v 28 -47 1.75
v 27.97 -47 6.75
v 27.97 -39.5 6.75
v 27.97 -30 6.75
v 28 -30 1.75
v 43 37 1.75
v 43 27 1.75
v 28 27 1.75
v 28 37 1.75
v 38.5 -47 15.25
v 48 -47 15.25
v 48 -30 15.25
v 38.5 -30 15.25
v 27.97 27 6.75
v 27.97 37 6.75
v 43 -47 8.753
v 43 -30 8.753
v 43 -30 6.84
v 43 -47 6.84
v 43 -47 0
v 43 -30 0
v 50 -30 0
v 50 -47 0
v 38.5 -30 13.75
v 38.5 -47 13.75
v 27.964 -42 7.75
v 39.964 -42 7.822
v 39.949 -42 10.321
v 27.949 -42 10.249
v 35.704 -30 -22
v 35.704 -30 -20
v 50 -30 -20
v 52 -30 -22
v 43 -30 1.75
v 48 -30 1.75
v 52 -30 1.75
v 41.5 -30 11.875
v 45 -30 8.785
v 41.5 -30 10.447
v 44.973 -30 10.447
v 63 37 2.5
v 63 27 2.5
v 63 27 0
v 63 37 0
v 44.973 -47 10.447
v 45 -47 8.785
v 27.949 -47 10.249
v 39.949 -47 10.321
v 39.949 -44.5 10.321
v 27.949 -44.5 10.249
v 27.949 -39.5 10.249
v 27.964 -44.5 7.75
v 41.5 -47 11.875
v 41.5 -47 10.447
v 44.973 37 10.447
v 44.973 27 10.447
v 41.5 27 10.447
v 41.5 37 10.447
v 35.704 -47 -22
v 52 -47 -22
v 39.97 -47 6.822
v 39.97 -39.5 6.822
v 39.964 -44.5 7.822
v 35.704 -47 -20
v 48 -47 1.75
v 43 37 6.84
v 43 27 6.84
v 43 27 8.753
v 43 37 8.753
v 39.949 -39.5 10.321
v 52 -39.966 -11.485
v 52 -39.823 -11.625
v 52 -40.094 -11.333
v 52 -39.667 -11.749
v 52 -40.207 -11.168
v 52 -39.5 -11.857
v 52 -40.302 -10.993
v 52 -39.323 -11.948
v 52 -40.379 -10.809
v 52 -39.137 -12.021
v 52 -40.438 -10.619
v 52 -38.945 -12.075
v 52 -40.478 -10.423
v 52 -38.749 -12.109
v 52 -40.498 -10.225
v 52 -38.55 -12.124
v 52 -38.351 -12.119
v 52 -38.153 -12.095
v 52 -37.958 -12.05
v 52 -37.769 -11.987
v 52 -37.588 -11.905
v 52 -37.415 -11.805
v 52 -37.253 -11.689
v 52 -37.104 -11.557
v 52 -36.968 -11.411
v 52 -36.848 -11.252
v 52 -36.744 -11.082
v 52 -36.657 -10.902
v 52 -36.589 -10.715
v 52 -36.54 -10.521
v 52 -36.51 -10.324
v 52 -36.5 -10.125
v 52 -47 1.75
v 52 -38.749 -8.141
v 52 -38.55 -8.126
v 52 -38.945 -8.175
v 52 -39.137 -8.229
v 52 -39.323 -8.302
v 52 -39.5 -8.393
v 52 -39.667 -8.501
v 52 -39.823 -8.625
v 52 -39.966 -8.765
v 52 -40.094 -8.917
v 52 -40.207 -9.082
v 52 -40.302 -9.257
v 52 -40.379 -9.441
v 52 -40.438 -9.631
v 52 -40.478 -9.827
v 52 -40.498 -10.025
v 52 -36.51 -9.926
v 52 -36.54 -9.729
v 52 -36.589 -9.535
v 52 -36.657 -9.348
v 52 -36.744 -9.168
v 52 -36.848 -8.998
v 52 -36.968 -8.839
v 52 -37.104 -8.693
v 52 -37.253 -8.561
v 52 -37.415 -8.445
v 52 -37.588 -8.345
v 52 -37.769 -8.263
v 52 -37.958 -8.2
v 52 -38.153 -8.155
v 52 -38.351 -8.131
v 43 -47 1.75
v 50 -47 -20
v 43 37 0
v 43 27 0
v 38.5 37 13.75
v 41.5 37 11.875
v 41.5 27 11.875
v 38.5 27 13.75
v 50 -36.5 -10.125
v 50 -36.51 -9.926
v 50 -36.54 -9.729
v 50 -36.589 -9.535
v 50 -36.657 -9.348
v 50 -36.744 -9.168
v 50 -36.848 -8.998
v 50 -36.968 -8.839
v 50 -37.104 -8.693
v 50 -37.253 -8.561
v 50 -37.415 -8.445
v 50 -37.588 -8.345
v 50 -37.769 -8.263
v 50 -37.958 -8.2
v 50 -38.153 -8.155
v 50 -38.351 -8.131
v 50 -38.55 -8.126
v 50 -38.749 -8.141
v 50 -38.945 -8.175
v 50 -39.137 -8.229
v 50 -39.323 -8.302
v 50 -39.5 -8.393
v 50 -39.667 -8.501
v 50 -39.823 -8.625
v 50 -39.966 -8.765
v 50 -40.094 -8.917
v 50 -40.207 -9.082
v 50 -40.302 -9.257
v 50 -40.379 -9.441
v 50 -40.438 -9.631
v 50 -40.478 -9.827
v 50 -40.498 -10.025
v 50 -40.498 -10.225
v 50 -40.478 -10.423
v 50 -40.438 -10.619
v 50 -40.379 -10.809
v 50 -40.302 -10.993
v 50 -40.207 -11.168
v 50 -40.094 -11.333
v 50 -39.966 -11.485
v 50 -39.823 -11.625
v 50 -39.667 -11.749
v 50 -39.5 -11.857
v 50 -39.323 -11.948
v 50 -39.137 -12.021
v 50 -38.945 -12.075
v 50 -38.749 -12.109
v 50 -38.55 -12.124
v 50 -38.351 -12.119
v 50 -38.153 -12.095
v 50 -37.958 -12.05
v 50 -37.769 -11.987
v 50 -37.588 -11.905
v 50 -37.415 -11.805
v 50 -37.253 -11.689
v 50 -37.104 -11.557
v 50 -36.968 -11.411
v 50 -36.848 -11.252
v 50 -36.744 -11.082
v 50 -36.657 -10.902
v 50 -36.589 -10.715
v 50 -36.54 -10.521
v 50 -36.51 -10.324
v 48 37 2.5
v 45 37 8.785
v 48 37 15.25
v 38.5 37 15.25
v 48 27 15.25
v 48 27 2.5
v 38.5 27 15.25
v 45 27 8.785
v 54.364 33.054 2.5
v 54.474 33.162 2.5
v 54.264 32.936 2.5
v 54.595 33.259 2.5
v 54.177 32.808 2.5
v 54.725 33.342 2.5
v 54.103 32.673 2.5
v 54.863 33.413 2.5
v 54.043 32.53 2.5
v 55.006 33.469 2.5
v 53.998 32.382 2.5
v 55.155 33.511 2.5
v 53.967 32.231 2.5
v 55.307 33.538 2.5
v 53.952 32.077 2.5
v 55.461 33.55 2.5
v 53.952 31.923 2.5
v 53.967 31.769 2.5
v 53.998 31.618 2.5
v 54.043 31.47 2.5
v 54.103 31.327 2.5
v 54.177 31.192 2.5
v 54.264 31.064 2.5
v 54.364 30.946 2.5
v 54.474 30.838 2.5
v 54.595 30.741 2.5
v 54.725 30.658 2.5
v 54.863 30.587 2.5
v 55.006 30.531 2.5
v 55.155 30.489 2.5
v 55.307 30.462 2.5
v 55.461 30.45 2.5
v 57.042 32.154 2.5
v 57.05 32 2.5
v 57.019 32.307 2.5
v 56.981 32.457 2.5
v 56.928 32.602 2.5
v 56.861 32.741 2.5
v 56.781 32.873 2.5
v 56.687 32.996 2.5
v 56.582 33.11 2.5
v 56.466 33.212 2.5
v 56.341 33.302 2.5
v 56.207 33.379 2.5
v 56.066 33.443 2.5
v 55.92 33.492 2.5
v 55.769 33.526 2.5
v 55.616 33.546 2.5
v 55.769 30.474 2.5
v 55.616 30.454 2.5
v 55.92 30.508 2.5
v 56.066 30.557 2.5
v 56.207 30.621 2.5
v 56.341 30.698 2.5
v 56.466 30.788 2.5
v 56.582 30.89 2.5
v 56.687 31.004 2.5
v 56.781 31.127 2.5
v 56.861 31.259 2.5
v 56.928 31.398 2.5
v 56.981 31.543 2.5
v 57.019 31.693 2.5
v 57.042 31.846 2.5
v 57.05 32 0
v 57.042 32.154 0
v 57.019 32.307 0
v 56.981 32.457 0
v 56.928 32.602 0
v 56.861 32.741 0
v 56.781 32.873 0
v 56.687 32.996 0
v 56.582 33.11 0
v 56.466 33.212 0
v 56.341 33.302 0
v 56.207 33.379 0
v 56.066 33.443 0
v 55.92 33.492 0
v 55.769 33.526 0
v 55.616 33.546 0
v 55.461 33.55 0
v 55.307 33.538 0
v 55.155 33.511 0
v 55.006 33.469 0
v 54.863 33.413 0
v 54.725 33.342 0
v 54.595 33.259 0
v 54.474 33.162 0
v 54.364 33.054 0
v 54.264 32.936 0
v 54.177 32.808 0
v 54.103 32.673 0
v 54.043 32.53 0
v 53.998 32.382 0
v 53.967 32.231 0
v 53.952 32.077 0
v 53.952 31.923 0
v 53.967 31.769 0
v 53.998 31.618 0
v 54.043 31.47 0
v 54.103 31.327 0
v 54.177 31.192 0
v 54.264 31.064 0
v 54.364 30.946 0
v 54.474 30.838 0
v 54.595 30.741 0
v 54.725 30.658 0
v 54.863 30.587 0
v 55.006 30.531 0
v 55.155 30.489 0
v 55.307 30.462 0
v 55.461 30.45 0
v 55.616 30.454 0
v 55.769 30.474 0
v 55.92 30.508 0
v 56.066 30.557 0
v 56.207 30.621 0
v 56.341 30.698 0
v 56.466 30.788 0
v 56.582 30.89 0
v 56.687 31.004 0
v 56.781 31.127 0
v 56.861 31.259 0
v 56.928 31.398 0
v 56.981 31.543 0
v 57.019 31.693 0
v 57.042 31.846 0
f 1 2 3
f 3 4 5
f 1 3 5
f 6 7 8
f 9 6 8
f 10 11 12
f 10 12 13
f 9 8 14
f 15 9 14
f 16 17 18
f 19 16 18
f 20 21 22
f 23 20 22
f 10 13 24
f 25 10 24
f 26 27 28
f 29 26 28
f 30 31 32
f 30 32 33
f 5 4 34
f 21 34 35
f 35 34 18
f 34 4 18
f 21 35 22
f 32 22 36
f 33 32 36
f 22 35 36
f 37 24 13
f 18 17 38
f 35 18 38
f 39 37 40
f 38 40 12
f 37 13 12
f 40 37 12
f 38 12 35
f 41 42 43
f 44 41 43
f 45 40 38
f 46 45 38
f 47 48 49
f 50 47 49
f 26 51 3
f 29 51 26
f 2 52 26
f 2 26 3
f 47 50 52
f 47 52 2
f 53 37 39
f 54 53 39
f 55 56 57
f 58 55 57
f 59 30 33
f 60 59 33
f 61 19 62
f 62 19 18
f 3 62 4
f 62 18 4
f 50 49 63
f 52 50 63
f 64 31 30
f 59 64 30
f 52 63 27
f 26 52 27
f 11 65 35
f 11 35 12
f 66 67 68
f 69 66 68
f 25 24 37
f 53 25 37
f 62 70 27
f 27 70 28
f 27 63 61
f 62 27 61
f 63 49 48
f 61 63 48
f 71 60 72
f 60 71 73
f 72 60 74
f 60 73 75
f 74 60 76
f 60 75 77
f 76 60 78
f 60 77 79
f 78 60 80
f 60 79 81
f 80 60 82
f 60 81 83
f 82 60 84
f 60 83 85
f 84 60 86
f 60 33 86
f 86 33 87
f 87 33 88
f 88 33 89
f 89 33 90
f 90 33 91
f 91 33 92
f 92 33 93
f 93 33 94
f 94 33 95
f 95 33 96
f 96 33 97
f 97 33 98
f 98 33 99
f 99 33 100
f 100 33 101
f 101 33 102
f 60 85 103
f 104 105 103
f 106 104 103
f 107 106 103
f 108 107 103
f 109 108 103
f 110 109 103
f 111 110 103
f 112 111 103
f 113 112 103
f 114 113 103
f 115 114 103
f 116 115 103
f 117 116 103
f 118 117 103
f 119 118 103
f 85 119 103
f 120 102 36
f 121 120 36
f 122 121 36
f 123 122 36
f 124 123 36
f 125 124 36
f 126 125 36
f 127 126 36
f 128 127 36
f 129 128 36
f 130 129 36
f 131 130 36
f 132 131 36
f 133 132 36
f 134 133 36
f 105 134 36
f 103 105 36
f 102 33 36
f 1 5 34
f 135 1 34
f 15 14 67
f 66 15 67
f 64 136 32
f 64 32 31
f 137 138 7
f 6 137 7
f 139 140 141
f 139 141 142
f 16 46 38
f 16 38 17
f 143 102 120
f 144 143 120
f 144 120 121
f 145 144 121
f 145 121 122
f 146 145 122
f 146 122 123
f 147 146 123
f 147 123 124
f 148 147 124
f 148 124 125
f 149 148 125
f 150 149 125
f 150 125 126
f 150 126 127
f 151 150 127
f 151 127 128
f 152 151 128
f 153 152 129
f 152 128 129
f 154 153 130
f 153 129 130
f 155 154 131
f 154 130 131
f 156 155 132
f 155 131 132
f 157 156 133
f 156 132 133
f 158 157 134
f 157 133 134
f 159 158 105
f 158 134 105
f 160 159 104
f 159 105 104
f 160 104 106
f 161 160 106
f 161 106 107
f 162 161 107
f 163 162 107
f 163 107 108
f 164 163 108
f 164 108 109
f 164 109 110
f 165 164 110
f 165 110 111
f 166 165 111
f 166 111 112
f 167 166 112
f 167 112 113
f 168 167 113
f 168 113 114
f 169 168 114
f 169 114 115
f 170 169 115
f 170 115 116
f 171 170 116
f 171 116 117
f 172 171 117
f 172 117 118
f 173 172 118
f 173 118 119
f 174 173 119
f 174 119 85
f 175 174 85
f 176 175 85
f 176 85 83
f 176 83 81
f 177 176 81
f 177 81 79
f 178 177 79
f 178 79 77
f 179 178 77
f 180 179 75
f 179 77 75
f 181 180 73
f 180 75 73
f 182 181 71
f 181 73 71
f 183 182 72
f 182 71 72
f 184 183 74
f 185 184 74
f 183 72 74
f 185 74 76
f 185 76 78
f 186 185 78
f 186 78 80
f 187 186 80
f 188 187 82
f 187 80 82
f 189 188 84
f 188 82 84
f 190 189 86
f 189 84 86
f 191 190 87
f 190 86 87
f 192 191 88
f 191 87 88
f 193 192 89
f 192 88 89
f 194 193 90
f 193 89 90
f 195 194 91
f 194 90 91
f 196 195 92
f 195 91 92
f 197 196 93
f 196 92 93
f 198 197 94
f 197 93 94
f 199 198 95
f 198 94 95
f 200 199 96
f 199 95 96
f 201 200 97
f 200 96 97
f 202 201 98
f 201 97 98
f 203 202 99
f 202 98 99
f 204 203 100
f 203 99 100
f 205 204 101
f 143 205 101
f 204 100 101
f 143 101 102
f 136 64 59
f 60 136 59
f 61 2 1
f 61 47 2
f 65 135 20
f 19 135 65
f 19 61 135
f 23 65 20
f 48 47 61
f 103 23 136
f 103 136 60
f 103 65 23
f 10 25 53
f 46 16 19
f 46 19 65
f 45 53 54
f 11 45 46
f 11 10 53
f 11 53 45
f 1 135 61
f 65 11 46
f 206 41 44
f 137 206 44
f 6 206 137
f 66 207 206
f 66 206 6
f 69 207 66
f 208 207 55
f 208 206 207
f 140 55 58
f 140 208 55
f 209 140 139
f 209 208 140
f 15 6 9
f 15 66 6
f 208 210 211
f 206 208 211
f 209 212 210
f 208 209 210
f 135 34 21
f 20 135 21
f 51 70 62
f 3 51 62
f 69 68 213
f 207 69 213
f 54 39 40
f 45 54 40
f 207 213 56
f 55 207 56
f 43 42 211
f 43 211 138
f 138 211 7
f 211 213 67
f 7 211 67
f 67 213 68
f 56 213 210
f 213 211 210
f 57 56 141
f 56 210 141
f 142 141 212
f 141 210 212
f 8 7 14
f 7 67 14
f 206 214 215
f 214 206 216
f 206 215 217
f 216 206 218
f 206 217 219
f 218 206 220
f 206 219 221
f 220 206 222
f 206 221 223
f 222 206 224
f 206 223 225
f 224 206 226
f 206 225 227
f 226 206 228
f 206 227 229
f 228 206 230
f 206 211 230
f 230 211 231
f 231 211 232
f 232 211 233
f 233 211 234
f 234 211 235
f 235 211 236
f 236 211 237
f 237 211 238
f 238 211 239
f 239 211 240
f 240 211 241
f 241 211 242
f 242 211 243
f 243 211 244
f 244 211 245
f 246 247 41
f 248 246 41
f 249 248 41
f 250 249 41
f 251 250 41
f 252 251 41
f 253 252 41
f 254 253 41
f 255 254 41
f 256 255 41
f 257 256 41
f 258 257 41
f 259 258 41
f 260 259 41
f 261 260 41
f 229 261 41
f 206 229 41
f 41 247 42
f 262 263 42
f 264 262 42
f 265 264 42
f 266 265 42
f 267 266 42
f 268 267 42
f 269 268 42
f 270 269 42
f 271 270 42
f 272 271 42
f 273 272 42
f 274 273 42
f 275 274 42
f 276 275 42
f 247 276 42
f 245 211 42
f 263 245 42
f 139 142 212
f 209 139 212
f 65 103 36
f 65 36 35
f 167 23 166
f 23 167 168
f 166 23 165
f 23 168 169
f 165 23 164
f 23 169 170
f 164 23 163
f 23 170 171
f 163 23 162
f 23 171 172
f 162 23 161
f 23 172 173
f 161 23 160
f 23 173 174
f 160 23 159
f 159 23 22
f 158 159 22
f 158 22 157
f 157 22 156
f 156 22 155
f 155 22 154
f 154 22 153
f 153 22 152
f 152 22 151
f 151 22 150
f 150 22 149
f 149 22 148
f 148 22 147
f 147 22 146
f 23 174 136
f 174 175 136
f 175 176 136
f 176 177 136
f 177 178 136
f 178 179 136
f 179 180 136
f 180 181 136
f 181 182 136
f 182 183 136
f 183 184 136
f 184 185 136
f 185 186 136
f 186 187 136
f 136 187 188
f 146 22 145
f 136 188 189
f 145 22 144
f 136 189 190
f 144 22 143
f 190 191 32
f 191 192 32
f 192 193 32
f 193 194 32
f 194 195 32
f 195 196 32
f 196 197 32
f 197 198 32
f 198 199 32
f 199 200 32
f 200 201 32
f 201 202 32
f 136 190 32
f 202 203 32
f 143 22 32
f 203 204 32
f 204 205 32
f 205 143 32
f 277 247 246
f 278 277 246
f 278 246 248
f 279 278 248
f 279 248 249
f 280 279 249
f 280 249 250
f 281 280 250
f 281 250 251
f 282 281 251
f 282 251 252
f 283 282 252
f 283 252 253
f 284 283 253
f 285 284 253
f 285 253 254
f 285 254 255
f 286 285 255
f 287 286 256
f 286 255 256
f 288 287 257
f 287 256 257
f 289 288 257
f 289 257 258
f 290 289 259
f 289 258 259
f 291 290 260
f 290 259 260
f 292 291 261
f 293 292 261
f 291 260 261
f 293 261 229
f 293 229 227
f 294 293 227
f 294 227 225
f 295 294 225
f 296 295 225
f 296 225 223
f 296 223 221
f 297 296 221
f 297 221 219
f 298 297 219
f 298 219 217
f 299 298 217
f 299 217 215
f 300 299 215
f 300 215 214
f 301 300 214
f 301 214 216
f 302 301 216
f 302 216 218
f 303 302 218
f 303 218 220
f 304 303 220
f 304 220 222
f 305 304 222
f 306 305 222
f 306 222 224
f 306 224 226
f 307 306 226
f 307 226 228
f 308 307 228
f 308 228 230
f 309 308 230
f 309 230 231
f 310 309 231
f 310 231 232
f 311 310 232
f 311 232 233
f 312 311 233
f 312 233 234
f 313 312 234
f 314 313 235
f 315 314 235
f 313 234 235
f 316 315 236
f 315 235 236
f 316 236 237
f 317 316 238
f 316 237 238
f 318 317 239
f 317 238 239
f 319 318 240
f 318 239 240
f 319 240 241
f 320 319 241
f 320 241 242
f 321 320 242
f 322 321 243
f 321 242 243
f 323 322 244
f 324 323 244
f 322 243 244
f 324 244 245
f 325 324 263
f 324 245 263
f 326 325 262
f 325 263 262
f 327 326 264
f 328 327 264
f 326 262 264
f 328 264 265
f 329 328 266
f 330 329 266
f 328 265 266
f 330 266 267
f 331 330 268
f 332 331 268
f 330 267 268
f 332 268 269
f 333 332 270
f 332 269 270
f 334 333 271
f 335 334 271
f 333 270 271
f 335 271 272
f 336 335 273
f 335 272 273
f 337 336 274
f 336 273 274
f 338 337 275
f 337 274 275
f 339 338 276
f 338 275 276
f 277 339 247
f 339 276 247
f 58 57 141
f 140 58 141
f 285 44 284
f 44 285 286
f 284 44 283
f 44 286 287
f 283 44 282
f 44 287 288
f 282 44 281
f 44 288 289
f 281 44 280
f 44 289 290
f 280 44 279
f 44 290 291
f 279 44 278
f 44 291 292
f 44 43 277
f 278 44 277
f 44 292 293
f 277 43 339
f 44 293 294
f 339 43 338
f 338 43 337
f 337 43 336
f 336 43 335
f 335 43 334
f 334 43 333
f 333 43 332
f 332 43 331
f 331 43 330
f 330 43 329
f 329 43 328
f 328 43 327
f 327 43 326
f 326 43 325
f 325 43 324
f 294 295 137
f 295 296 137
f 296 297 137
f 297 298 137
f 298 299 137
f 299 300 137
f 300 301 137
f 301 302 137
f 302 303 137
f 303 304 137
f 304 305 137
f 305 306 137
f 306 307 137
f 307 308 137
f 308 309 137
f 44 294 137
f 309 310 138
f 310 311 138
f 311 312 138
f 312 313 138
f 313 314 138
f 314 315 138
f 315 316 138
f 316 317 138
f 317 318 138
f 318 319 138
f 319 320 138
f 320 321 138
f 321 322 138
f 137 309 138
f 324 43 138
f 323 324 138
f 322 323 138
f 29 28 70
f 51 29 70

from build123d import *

# Parameters (mm, degrees)
F1_DEPTH  = 47
F2_DEPTH  = 30
F4_DEPTH  = 12
F5_R      = 2
F6_DEPTH  = 3
F9_DEPTH  = 10
F10_R     = 1.55
F11_DEPTH = 25


with BuildPart() as f1:
    # F0 (on Front) → F1 (new body)
    with BuildSketch(Plane.XZ):
        Polygon((27.9699712028, 6.7499098263), (28, 1.75), (43, 1.75), (43, 0), (48, 0), (50, 0), (52, 0), (52, 1.75), (48, 1.75), (48, 13.75), (48, 15.25), (38.5, 15.25), (38.5, 13.75), (41.5, 11.875), (41.5, 10.4472711682), (44.9731051922, 10.4472711682), (45, 8.7854899466), (43, 8.7531212961), (43, 6.8401781918), align=None)
        Polygon((52, 0), (50, 0), (50, -20), (35.7036739588, -20), (35.7036739588, -22), (52, -22), align=None)
    extrude(amount=F1_DEPTH)

    # F0 (on Front) → F2 (cut)
    with BuildSketch(Plane.XZ):
        Polygon((27.9699712028, 6.7499098263), (28, 1.75), (43, 1.75), (43, 0), (48, 0), (50, 0), (52, 0), (52, 1.75), (48, 1.75), (48, 13.75), (48, 15.25), (38.5, 15.25), (38.5, 13.75), (41.5, 11.875), (41.5, 10.4472711682), (44.9731051922, 10.4472711682), (45, 8.7854899466), (43, 8.7531212961), (43, 6.8401781918), align=None)
        Polygon((52, 0), (50, 0), (50, -20), (35.7036739588, -20), (35.7036739588, -22), (52, -22), align=None)
    extrude(amount=F2_DEPTH, mode=Mode.SUBTRACT)

    # F3 (on face) → F4 (join)
    with BuildSketch(Plane(origin=(28.0094999534, 0, 0.1682213529), x_dir=(0, -1, 0), z_dir=(-0.9999819653, 0, -0.0060057594))):
        Polygon((39.5, 5.9370710514), (47, 5.9370710514), (47, 7.0816674463), (47, 10.0810629427), (44.5, 10.0810629427), (44.5, 7.5816674463), (42, 7.5816674463), (42, 9.5810629427), (42, 10.0810629427), (39.5, 10.0810629427), (39.5, 9.5810629427), align=None)
    extrude(amount=-F4_DEPTH)

    # F5 (on face) → F6 (cut)
    with BuildSketch(Plane.YZ.offset(52)):
        with Locations((-38.5, -10.125)):
            Circle(F5_R)
    extrude(amount=-F6_DEPTH, mode=Mode.SUBTRACT)


with BuildPart() as f9:
    # F8 (on offset) → F9 (new body)
    with BuildSketch(Plane(origin=(0, 27, 0), x_dir=(-1, 0, 0), z_dir=(0, 1, 0))):
        Polygon((-43, 1.75), (-28, 1.75), (-27.9699712028, 6.7499098263), (-43, 6.8401781918), (-43, 8.7531212961), (-45, 8.7854899466), (-44.9731051922, 10.4472711682), (-41.5, 10.4472711682), (-41.5, 11.875), (-38.5, 13.75), (-38.5, 15.25), (-48, 15.25), (-48, 2.5), (-63, 2.5), (-63, 0), (-43, 0), align=None)
    extrude(amount=F9_DEPTH)

    # F10 (on face) → F11 (cut)
    with BuildSketch(Plane.XY.offset(2.5)):
        with Locations((55.5, 32)):
            Circle(F10_R)
    extrude(amount=-F11_DEPTH, mode=Mode.SUBTRACT)


solid = Compound([f1.part, f9.part])
